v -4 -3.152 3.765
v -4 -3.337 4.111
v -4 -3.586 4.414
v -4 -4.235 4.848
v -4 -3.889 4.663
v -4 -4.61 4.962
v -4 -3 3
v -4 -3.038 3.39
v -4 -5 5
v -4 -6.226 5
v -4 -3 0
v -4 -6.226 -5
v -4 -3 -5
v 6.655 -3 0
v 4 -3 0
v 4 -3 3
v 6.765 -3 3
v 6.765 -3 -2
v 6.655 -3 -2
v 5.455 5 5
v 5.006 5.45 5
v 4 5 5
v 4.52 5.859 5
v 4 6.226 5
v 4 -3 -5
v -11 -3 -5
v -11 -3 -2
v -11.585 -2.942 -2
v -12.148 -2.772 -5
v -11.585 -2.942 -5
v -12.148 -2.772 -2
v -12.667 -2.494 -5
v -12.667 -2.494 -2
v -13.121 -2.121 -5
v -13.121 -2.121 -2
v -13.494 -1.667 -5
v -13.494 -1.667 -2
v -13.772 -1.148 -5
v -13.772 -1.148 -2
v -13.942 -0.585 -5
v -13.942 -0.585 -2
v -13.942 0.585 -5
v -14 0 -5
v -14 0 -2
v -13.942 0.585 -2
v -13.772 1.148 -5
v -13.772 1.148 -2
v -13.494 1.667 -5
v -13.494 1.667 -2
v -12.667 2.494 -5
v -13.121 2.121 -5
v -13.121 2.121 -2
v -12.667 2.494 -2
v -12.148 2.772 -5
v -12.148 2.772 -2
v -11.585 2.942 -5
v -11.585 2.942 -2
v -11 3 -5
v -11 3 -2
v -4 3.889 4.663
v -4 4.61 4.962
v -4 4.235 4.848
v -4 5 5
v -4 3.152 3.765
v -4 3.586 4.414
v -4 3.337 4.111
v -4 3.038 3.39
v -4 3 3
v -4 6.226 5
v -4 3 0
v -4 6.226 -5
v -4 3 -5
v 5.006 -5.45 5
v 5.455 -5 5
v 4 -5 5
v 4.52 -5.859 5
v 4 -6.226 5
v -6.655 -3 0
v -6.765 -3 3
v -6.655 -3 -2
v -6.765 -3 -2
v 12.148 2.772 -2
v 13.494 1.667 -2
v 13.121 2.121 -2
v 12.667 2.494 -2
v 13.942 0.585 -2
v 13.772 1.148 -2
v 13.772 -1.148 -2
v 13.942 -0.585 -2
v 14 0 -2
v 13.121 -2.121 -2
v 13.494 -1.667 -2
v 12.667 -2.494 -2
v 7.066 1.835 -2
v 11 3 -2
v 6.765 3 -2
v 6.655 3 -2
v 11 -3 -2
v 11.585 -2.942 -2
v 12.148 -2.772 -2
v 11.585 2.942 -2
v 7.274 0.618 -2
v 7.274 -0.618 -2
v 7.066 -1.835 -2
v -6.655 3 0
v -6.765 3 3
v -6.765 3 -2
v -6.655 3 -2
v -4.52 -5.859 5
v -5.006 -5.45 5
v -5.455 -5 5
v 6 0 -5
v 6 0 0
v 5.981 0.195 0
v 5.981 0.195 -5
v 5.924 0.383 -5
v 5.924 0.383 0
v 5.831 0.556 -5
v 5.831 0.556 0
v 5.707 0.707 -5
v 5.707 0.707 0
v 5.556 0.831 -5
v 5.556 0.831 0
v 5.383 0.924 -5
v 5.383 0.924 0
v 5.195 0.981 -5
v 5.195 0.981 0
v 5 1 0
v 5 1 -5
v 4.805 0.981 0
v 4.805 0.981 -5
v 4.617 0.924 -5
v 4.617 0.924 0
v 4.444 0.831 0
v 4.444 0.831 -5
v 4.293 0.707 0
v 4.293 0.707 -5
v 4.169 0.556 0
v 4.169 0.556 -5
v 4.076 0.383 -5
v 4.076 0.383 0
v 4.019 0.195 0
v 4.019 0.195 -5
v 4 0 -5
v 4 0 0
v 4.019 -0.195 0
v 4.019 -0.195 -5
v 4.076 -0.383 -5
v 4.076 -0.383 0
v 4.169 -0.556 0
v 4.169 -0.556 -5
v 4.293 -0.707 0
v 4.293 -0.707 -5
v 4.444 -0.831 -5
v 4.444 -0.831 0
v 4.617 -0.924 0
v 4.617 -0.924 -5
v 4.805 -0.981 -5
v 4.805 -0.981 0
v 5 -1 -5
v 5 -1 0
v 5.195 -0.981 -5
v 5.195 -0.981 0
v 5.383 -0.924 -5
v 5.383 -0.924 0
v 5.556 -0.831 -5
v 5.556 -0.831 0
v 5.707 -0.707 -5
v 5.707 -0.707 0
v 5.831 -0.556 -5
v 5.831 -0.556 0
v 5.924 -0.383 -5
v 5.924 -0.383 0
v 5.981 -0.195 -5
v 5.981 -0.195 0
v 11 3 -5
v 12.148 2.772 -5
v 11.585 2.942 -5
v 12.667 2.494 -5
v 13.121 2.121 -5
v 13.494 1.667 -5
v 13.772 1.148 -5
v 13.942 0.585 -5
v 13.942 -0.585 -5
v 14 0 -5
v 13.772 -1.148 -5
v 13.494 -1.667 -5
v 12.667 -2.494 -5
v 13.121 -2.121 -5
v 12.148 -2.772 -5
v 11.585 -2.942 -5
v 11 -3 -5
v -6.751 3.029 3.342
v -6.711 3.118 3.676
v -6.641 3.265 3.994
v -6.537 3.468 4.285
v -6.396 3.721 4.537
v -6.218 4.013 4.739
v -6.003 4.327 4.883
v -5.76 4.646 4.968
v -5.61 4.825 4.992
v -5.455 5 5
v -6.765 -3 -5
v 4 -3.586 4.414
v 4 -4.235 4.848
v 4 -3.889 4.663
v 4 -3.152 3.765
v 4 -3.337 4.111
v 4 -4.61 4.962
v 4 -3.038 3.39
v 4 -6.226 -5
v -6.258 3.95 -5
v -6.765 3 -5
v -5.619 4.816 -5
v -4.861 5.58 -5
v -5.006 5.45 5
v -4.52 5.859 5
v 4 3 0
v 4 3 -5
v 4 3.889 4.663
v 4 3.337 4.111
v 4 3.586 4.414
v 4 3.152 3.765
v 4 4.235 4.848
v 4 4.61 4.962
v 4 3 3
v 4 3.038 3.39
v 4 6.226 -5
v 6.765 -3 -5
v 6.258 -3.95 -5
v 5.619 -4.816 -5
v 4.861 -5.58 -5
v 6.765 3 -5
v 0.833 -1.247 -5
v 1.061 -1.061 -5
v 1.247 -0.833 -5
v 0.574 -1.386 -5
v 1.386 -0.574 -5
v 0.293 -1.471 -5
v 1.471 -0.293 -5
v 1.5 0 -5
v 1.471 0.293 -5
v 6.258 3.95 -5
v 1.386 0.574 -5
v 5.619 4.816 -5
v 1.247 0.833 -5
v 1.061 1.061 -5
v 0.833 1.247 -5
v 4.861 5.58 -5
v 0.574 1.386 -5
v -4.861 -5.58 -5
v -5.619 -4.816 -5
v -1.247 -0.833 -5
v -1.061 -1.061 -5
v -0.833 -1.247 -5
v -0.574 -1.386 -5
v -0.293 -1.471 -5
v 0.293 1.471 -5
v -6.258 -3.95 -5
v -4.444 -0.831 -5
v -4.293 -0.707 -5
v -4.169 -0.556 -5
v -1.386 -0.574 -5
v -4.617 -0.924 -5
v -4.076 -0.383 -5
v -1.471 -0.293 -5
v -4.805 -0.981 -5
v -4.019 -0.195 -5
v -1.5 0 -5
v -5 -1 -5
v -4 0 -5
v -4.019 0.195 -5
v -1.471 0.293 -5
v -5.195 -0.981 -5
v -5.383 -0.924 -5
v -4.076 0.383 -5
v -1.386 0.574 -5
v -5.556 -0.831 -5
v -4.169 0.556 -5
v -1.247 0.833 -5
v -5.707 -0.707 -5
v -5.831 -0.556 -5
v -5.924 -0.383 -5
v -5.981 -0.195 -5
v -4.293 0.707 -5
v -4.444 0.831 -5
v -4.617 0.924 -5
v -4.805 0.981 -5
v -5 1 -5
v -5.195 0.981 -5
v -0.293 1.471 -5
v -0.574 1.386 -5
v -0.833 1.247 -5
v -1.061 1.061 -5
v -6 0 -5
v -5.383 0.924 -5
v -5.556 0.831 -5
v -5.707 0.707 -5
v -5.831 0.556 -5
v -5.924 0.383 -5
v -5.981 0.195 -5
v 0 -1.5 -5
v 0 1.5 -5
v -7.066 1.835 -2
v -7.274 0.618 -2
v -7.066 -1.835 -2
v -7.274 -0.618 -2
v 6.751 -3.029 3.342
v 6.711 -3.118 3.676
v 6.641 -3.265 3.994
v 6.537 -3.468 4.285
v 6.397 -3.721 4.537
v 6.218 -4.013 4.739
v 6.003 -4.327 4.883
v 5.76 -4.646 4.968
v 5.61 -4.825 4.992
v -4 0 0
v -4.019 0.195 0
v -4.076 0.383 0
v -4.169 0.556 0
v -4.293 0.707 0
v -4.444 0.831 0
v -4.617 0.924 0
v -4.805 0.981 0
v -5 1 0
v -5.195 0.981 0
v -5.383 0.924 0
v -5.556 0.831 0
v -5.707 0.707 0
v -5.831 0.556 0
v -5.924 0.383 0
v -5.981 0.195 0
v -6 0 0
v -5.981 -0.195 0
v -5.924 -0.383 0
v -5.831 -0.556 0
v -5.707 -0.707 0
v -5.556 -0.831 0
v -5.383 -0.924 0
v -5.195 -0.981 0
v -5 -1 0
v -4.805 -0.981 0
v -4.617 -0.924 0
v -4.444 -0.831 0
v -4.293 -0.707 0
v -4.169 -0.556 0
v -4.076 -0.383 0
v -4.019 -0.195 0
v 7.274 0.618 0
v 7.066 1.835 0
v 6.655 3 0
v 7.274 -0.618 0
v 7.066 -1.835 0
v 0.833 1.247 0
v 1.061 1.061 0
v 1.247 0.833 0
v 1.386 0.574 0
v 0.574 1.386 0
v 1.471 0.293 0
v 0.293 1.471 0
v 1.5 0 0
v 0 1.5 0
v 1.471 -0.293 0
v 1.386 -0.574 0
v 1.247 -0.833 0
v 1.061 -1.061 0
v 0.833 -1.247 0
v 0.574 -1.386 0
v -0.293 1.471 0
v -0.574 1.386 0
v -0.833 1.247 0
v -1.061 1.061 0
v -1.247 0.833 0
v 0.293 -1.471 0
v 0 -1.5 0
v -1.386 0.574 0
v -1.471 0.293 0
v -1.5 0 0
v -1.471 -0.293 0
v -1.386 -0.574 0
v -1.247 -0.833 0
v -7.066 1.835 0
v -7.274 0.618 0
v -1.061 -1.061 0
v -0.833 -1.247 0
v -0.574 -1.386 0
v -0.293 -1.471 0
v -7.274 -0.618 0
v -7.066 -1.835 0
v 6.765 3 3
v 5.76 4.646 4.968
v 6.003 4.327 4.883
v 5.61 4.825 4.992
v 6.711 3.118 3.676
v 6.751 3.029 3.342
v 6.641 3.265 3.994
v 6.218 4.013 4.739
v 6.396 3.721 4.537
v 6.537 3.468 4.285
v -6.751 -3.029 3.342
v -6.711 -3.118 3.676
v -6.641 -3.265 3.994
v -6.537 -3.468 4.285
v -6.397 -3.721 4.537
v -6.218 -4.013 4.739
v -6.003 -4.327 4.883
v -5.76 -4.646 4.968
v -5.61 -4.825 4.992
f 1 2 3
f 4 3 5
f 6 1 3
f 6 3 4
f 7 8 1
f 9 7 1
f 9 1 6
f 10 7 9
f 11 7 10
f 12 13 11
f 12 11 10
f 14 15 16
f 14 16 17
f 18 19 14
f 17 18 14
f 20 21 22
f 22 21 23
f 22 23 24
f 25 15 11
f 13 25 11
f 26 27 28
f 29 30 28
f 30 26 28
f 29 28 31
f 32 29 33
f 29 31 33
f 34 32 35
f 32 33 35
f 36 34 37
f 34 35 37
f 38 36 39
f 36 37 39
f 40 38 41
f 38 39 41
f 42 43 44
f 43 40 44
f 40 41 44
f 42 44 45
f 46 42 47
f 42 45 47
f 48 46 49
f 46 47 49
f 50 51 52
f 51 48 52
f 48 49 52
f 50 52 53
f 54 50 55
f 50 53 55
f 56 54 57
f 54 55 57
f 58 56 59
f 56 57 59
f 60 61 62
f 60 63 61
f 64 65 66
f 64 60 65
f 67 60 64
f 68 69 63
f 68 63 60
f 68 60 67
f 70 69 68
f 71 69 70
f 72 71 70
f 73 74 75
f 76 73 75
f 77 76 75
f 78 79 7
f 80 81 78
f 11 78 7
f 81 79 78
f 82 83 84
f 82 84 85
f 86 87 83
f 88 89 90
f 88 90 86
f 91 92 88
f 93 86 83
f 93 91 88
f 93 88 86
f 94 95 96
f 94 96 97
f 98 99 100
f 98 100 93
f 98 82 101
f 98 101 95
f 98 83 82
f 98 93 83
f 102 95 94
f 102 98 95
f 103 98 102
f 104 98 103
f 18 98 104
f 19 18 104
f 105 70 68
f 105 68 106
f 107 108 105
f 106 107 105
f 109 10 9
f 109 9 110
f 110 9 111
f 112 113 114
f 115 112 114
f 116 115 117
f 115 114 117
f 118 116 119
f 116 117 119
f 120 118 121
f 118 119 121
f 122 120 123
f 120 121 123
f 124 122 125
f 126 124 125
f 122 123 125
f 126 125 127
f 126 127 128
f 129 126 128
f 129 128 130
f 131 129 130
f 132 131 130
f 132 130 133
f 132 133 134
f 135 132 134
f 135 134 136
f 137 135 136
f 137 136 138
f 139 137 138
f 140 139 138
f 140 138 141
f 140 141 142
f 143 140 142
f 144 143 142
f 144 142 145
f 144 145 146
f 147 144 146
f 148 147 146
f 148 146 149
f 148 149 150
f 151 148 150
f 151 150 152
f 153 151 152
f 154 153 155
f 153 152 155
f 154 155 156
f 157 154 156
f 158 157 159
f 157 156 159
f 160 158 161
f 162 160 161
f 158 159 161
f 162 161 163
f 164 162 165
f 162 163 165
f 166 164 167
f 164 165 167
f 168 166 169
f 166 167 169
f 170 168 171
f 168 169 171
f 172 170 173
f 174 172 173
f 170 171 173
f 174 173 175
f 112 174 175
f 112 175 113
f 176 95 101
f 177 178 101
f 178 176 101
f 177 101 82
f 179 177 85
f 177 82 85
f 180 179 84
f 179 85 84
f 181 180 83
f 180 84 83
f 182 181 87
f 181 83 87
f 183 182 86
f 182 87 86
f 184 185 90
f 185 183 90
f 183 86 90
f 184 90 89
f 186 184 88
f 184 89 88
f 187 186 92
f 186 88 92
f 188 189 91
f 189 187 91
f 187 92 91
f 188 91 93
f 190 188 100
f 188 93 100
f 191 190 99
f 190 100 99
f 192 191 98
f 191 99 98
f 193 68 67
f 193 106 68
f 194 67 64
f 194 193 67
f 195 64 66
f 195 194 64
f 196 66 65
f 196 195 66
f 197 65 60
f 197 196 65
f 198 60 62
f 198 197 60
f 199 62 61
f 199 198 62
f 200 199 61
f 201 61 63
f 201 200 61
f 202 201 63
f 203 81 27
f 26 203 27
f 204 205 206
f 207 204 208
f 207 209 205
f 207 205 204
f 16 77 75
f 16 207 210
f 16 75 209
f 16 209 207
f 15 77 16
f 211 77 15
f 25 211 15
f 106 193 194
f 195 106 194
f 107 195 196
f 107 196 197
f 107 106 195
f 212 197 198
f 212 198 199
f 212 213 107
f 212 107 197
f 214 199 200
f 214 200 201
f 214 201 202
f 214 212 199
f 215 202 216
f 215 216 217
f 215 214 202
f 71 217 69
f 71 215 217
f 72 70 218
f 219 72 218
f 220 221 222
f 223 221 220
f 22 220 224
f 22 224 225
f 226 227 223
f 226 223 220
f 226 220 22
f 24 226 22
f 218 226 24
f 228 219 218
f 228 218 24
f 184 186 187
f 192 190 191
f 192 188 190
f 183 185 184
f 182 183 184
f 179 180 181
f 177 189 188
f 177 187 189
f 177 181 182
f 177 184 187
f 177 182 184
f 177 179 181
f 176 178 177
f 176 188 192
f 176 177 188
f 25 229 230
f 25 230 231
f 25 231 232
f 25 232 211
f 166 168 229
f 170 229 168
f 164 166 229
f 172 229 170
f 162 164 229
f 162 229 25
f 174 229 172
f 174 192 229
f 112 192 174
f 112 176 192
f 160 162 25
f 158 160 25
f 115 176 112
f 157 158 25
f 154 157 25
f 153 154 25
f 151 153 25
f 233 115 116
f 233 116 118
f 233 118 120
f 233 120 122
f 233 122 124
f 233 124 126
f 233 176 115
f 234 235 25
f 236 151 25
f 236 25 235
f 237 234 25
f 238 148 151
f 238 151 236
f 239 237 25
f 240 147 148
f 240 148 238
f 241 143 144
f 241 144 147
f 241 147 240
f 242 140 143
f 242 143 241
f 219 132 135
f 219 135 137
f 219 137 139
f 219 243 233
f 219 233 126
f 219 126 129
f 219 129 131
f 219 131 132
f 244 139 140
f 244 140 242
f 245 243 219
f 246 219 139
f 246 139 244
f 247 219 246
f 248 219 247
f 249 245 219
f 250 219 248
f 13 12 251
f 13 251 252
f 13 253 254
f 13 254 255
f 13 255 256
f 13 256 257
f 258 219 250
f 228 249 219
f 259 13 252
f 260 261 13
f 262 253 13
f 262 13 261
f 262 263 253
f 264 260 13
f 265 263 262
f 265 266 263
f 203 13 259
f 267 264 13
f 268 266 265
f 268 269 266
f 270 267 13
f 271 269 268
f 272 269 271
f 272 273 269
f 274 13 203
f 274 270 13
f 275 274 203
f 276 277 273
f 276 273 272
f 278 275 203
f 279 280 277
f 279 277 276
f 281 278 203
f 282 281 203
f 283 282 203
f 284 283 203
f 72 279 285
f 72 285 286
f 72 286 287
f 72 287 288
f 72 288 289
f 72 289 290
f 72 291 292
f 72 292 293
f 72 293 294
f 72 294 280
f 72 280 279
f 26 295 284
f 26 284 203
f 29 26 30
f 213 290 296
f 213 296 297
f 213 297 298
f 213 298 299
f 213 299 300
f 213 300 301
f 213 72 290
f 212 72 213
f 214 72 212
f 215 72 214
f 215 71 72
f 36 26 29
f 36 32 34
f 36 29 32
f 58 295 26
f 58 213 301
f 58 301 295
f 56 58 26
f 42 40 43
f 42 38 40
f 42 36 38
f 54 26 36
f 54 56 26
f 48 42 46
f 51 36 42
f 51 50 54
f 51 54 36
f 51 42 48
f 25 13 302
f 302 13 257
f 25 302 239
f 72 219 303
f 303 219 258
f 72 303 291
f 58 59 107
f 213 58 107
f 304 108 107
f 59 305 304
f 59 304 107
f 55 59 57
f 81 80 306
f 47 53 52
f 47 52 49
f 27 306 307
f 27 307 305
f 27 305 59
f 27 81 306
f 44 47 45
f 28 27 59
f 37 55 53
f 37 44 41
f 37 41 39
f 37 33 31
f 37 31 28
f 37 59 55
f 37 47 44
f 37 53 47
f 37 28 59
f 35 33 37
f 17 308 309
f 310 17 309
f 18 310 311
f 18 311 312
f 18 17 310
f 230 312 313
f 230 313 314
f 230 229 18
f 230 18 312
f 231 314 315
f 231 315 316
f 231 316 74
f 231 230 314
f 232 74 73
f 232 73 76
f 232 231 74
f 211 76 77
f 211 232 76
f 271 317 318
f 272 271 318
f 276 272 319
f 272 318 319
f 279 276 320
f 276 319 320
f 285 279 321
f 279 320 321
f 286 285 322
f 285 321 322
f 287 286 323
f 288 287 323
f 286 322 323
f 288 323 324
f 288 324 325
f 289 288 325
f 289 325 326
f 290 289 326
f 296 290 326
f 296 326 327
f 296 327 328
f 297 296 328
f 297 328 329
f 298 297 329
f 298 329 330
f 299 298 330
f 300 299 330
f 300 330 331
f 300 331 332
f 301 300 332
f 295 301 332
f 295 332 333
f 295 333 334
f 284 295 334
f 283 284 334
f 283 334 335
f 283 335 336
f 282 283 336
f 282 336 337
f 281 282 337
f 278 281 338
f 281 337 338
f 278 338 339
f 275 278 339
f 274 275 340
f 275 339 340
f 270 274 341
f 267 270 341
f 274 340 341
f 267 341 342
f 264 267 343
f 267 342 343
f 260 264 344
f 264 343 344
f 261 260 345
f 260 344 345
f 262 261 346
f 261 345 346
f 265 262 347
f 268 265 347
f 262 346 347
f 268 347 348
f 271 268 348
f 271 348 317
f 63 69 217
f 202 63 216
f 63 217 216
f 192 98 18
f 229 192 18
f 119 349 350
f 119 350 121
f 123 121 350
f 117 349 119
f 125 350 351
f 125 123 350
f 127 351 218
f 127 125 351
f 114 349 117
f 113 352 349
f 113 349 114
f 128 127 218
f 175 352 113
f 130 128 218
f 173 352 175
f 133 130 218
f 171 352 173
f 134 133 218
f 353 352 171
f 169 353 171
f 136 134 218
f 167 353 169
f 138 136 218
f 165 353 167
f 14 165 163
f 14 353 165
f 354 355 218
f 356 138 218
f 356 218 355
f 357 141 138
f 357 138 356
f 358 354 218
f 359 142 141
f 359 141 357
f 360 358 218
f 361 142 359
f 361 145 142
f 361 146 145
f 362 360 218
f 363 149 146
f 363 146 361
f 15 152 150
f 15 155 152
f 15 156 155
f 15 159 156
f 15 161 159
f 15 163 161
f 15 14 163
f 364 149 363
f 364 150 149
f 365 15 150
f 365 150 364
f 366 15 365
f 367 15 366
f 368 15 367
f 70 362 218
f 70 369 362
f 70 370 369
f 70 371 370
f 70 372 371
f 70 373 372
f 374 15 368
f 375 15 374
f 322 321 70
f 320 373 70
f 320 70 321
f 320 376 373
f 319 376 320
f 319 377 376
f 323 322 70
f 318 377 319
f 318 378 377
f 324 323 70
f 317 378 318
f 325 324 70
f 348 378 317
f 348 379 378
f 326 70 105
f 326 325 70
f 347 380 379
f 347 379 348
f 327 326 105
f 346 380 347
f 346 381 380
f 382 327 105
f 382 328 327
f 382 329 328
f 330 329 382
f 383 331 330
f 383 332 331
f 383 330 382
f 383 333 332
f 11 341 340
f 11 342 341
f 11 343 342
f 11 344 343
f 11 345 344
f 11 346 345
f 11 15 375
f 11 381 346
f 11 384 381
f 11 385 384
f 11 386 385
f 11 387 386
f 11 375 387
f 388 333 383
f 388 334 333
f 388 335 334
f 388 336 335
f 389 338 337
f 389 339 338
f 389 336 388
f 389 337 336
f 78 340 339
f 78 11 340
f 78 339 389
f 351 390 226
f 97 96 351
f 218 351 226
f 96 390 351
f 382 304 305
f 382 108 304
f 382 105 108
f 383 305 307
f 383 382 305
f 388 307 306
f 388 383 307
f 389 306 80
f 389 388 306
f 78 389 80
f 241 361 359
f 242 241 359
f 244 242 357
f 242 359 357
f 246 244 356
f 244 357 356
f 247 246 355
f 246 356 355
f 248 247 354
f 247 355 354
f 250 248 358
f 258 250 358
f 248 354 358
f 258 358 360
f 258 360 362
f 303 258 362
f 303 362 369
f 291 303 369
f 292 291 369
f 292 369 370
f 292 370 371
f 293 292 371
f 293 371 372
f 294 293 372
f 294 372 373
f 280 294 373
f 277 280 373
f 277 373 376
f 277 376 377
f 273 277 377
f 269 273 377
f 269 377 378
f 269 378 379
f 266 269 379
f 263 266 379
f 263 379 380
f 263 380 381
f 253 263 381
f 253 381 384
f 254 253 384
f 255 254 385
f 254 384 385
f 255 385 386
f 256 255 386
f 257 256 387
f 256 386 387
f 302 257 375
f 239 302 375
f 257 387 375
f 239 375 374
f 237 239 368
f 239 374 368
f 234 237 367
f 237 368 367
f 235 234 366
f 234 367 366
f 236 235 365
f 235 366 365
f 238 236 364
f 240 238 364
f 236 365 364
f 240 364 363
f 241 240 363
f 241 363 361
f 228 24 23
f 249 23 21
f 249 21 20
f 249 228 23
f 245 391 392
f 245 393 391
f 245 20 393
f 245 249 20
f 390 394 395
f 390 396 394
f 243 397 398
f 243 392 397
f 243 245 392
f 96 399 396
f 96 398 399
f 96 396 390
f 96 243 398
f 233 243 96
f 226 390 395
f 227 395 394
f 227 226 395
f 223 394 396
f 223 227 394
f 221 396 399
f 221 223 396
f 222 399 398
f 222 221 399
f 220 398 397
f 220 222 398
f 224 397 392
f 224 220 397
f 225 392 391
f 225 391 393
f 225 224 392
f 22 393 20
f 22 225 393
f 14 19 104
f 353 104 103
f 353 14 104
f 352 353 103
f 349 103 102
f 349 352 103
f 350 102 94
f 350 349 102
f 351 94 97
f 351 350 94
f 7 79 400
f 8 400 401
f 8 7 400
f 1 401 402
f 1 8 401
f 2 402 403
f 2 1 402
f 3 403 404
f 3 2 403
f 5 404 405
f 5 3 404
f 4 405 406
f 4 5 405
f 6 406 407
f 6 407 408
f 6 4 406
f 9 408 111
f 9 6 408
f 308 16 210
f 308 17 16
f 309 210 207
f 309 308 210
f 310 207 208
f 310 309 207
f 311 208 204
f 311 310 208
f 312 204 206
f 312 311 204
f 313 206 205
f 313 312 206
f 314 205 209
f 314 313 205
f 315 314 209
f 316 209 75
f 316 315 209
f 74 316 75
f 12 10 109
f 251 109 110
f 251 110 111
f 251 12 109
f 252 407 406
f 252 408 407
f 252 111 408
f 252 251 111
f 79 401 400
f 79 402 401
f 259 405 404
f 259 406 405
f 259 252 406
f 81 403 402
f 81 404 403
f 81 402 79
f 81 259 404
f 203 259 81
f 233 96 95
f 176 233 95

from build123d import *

# Parameters (mm, degrees)
SKETCH_2_W          = 49.662427868
SKETCH_2_H          = 43.948008528
CUT_EXTRUDE_1_DEPTH = 10
SKETCH_3_R          = 1.5
SKETCH_3_R_2        = 1
CUT_EXTRUDE_2_DEPTH = 16.165750888
EXTRUDE_1_DEPTH     = 10
FILLET_1_R          = 2


with BuildPart() as part:
    # 草图1 → 旋转3 (revolve)
    with BuildSketch(Plane(origin=(0, 0, 0), x_dir=(1, 0, 0), z_dir=(0, 1, 0)), mode=Mode.PRIVATE) as revolve_3_sk:
        Polygon((0, 0), (0, 5), (20, 5), (20, 2), (7.3, 2), (7.3, 0), align=None)
    revolve(revolve_3_sk.sketch.rotate(Axis((0, 0, 0), (0, 0, 1)), 180), axis=Axis((0, 0, 0), (0, 0, 1)))

    # 草图2 → 切除-拉伸1 (cut)
    with BuildSketch(Plane.XY):
        Rectangle(SKETCH_2_W, SKETCH_2_H)
        with BuildLine():
            Line((11, -3), (-11, -3))
            ThreePointArc((-11, -3), (-14, 0), (-11, 3))
            Line((-11, 3), (11, 3))
            ThreePointArc((11, 3), (14, 0), (11, -3))
        make_face(mode=Mode.SUBTRACT)
    extrude(amount=-CUT_EXTRUDE_1_DEPTH, mode=Mode.SUBTRACT)

    # 草图3 → 切除-拉伸2 (cut, through all)
    with BuildSketch(Plane.XY):
        Circle(SKETCH_3_R)
        with Locations((5, 0)):
            Circle(SKETCH_3_R_2)
        with Locations((-5, 0)):
            Circle(SKETCH_3_R_2)
    extrude(amount=-CUT_EXTRUDE_2_DEPTH, mode=Mode.SUBTRACT)

    # 草图4 → 凸台-拉伸1 (add)
    with BuildSketch(Plane(origin=(0, 0, -5), x_dir=(-1, 0, 0), z_dir=(0, 0, -1))):
        with BuildLine():
            Line((-4, 3), (-4, 6.225752967))
            ThreePointArc((-4, 6.225752967), (-5.618771945, 4.815537543), (-6.76461381, 3))
            Line((-6.76461381, 3), (-4, 3))
        make_face()
        with BuildLine():
            ThreePointArc((6.76461381, 3), (5.618771945, 4.815537543), (4, 6.225752967))
            Line((4, 6.225752967), (4, 3))
            Line((4, 3), (6.76461381, 3))
        make_face()
        with BuildLine():
            Line((6.76461381, -3), (4, -3))
            Line((4, -3), (4, -6.225752967))
            ThreePointArc((4, -6.225752967), (5.618771945, -4.815537543), (6.76461381, -3))
        make_face()
        with BuildLine():
            Line((-4, -6.225752967), (-4, -3))
            Line((-4, -3), (-6.76461381, -3))
            ThreePointArc((-6.76461381, -3), (-5.618771945, -4.815537543), (-4, -6.225752967))
        make_face()
    extrude(amount=-EXTRUDE_1_DEPTH)

    # 圆角1
    fillet_1_edges = [part.edges().sort_by_distance(p)[0] for p in [
        (5.382306905, -3, 5),
        (5.382306905, 3, 5),
        (-5.382306905, 3, 5),
        (-5.382306905, -3, 5),
    ]]
    fillet(fillet_1_edges, radius=FILLET_1_R)


solid = part.part
